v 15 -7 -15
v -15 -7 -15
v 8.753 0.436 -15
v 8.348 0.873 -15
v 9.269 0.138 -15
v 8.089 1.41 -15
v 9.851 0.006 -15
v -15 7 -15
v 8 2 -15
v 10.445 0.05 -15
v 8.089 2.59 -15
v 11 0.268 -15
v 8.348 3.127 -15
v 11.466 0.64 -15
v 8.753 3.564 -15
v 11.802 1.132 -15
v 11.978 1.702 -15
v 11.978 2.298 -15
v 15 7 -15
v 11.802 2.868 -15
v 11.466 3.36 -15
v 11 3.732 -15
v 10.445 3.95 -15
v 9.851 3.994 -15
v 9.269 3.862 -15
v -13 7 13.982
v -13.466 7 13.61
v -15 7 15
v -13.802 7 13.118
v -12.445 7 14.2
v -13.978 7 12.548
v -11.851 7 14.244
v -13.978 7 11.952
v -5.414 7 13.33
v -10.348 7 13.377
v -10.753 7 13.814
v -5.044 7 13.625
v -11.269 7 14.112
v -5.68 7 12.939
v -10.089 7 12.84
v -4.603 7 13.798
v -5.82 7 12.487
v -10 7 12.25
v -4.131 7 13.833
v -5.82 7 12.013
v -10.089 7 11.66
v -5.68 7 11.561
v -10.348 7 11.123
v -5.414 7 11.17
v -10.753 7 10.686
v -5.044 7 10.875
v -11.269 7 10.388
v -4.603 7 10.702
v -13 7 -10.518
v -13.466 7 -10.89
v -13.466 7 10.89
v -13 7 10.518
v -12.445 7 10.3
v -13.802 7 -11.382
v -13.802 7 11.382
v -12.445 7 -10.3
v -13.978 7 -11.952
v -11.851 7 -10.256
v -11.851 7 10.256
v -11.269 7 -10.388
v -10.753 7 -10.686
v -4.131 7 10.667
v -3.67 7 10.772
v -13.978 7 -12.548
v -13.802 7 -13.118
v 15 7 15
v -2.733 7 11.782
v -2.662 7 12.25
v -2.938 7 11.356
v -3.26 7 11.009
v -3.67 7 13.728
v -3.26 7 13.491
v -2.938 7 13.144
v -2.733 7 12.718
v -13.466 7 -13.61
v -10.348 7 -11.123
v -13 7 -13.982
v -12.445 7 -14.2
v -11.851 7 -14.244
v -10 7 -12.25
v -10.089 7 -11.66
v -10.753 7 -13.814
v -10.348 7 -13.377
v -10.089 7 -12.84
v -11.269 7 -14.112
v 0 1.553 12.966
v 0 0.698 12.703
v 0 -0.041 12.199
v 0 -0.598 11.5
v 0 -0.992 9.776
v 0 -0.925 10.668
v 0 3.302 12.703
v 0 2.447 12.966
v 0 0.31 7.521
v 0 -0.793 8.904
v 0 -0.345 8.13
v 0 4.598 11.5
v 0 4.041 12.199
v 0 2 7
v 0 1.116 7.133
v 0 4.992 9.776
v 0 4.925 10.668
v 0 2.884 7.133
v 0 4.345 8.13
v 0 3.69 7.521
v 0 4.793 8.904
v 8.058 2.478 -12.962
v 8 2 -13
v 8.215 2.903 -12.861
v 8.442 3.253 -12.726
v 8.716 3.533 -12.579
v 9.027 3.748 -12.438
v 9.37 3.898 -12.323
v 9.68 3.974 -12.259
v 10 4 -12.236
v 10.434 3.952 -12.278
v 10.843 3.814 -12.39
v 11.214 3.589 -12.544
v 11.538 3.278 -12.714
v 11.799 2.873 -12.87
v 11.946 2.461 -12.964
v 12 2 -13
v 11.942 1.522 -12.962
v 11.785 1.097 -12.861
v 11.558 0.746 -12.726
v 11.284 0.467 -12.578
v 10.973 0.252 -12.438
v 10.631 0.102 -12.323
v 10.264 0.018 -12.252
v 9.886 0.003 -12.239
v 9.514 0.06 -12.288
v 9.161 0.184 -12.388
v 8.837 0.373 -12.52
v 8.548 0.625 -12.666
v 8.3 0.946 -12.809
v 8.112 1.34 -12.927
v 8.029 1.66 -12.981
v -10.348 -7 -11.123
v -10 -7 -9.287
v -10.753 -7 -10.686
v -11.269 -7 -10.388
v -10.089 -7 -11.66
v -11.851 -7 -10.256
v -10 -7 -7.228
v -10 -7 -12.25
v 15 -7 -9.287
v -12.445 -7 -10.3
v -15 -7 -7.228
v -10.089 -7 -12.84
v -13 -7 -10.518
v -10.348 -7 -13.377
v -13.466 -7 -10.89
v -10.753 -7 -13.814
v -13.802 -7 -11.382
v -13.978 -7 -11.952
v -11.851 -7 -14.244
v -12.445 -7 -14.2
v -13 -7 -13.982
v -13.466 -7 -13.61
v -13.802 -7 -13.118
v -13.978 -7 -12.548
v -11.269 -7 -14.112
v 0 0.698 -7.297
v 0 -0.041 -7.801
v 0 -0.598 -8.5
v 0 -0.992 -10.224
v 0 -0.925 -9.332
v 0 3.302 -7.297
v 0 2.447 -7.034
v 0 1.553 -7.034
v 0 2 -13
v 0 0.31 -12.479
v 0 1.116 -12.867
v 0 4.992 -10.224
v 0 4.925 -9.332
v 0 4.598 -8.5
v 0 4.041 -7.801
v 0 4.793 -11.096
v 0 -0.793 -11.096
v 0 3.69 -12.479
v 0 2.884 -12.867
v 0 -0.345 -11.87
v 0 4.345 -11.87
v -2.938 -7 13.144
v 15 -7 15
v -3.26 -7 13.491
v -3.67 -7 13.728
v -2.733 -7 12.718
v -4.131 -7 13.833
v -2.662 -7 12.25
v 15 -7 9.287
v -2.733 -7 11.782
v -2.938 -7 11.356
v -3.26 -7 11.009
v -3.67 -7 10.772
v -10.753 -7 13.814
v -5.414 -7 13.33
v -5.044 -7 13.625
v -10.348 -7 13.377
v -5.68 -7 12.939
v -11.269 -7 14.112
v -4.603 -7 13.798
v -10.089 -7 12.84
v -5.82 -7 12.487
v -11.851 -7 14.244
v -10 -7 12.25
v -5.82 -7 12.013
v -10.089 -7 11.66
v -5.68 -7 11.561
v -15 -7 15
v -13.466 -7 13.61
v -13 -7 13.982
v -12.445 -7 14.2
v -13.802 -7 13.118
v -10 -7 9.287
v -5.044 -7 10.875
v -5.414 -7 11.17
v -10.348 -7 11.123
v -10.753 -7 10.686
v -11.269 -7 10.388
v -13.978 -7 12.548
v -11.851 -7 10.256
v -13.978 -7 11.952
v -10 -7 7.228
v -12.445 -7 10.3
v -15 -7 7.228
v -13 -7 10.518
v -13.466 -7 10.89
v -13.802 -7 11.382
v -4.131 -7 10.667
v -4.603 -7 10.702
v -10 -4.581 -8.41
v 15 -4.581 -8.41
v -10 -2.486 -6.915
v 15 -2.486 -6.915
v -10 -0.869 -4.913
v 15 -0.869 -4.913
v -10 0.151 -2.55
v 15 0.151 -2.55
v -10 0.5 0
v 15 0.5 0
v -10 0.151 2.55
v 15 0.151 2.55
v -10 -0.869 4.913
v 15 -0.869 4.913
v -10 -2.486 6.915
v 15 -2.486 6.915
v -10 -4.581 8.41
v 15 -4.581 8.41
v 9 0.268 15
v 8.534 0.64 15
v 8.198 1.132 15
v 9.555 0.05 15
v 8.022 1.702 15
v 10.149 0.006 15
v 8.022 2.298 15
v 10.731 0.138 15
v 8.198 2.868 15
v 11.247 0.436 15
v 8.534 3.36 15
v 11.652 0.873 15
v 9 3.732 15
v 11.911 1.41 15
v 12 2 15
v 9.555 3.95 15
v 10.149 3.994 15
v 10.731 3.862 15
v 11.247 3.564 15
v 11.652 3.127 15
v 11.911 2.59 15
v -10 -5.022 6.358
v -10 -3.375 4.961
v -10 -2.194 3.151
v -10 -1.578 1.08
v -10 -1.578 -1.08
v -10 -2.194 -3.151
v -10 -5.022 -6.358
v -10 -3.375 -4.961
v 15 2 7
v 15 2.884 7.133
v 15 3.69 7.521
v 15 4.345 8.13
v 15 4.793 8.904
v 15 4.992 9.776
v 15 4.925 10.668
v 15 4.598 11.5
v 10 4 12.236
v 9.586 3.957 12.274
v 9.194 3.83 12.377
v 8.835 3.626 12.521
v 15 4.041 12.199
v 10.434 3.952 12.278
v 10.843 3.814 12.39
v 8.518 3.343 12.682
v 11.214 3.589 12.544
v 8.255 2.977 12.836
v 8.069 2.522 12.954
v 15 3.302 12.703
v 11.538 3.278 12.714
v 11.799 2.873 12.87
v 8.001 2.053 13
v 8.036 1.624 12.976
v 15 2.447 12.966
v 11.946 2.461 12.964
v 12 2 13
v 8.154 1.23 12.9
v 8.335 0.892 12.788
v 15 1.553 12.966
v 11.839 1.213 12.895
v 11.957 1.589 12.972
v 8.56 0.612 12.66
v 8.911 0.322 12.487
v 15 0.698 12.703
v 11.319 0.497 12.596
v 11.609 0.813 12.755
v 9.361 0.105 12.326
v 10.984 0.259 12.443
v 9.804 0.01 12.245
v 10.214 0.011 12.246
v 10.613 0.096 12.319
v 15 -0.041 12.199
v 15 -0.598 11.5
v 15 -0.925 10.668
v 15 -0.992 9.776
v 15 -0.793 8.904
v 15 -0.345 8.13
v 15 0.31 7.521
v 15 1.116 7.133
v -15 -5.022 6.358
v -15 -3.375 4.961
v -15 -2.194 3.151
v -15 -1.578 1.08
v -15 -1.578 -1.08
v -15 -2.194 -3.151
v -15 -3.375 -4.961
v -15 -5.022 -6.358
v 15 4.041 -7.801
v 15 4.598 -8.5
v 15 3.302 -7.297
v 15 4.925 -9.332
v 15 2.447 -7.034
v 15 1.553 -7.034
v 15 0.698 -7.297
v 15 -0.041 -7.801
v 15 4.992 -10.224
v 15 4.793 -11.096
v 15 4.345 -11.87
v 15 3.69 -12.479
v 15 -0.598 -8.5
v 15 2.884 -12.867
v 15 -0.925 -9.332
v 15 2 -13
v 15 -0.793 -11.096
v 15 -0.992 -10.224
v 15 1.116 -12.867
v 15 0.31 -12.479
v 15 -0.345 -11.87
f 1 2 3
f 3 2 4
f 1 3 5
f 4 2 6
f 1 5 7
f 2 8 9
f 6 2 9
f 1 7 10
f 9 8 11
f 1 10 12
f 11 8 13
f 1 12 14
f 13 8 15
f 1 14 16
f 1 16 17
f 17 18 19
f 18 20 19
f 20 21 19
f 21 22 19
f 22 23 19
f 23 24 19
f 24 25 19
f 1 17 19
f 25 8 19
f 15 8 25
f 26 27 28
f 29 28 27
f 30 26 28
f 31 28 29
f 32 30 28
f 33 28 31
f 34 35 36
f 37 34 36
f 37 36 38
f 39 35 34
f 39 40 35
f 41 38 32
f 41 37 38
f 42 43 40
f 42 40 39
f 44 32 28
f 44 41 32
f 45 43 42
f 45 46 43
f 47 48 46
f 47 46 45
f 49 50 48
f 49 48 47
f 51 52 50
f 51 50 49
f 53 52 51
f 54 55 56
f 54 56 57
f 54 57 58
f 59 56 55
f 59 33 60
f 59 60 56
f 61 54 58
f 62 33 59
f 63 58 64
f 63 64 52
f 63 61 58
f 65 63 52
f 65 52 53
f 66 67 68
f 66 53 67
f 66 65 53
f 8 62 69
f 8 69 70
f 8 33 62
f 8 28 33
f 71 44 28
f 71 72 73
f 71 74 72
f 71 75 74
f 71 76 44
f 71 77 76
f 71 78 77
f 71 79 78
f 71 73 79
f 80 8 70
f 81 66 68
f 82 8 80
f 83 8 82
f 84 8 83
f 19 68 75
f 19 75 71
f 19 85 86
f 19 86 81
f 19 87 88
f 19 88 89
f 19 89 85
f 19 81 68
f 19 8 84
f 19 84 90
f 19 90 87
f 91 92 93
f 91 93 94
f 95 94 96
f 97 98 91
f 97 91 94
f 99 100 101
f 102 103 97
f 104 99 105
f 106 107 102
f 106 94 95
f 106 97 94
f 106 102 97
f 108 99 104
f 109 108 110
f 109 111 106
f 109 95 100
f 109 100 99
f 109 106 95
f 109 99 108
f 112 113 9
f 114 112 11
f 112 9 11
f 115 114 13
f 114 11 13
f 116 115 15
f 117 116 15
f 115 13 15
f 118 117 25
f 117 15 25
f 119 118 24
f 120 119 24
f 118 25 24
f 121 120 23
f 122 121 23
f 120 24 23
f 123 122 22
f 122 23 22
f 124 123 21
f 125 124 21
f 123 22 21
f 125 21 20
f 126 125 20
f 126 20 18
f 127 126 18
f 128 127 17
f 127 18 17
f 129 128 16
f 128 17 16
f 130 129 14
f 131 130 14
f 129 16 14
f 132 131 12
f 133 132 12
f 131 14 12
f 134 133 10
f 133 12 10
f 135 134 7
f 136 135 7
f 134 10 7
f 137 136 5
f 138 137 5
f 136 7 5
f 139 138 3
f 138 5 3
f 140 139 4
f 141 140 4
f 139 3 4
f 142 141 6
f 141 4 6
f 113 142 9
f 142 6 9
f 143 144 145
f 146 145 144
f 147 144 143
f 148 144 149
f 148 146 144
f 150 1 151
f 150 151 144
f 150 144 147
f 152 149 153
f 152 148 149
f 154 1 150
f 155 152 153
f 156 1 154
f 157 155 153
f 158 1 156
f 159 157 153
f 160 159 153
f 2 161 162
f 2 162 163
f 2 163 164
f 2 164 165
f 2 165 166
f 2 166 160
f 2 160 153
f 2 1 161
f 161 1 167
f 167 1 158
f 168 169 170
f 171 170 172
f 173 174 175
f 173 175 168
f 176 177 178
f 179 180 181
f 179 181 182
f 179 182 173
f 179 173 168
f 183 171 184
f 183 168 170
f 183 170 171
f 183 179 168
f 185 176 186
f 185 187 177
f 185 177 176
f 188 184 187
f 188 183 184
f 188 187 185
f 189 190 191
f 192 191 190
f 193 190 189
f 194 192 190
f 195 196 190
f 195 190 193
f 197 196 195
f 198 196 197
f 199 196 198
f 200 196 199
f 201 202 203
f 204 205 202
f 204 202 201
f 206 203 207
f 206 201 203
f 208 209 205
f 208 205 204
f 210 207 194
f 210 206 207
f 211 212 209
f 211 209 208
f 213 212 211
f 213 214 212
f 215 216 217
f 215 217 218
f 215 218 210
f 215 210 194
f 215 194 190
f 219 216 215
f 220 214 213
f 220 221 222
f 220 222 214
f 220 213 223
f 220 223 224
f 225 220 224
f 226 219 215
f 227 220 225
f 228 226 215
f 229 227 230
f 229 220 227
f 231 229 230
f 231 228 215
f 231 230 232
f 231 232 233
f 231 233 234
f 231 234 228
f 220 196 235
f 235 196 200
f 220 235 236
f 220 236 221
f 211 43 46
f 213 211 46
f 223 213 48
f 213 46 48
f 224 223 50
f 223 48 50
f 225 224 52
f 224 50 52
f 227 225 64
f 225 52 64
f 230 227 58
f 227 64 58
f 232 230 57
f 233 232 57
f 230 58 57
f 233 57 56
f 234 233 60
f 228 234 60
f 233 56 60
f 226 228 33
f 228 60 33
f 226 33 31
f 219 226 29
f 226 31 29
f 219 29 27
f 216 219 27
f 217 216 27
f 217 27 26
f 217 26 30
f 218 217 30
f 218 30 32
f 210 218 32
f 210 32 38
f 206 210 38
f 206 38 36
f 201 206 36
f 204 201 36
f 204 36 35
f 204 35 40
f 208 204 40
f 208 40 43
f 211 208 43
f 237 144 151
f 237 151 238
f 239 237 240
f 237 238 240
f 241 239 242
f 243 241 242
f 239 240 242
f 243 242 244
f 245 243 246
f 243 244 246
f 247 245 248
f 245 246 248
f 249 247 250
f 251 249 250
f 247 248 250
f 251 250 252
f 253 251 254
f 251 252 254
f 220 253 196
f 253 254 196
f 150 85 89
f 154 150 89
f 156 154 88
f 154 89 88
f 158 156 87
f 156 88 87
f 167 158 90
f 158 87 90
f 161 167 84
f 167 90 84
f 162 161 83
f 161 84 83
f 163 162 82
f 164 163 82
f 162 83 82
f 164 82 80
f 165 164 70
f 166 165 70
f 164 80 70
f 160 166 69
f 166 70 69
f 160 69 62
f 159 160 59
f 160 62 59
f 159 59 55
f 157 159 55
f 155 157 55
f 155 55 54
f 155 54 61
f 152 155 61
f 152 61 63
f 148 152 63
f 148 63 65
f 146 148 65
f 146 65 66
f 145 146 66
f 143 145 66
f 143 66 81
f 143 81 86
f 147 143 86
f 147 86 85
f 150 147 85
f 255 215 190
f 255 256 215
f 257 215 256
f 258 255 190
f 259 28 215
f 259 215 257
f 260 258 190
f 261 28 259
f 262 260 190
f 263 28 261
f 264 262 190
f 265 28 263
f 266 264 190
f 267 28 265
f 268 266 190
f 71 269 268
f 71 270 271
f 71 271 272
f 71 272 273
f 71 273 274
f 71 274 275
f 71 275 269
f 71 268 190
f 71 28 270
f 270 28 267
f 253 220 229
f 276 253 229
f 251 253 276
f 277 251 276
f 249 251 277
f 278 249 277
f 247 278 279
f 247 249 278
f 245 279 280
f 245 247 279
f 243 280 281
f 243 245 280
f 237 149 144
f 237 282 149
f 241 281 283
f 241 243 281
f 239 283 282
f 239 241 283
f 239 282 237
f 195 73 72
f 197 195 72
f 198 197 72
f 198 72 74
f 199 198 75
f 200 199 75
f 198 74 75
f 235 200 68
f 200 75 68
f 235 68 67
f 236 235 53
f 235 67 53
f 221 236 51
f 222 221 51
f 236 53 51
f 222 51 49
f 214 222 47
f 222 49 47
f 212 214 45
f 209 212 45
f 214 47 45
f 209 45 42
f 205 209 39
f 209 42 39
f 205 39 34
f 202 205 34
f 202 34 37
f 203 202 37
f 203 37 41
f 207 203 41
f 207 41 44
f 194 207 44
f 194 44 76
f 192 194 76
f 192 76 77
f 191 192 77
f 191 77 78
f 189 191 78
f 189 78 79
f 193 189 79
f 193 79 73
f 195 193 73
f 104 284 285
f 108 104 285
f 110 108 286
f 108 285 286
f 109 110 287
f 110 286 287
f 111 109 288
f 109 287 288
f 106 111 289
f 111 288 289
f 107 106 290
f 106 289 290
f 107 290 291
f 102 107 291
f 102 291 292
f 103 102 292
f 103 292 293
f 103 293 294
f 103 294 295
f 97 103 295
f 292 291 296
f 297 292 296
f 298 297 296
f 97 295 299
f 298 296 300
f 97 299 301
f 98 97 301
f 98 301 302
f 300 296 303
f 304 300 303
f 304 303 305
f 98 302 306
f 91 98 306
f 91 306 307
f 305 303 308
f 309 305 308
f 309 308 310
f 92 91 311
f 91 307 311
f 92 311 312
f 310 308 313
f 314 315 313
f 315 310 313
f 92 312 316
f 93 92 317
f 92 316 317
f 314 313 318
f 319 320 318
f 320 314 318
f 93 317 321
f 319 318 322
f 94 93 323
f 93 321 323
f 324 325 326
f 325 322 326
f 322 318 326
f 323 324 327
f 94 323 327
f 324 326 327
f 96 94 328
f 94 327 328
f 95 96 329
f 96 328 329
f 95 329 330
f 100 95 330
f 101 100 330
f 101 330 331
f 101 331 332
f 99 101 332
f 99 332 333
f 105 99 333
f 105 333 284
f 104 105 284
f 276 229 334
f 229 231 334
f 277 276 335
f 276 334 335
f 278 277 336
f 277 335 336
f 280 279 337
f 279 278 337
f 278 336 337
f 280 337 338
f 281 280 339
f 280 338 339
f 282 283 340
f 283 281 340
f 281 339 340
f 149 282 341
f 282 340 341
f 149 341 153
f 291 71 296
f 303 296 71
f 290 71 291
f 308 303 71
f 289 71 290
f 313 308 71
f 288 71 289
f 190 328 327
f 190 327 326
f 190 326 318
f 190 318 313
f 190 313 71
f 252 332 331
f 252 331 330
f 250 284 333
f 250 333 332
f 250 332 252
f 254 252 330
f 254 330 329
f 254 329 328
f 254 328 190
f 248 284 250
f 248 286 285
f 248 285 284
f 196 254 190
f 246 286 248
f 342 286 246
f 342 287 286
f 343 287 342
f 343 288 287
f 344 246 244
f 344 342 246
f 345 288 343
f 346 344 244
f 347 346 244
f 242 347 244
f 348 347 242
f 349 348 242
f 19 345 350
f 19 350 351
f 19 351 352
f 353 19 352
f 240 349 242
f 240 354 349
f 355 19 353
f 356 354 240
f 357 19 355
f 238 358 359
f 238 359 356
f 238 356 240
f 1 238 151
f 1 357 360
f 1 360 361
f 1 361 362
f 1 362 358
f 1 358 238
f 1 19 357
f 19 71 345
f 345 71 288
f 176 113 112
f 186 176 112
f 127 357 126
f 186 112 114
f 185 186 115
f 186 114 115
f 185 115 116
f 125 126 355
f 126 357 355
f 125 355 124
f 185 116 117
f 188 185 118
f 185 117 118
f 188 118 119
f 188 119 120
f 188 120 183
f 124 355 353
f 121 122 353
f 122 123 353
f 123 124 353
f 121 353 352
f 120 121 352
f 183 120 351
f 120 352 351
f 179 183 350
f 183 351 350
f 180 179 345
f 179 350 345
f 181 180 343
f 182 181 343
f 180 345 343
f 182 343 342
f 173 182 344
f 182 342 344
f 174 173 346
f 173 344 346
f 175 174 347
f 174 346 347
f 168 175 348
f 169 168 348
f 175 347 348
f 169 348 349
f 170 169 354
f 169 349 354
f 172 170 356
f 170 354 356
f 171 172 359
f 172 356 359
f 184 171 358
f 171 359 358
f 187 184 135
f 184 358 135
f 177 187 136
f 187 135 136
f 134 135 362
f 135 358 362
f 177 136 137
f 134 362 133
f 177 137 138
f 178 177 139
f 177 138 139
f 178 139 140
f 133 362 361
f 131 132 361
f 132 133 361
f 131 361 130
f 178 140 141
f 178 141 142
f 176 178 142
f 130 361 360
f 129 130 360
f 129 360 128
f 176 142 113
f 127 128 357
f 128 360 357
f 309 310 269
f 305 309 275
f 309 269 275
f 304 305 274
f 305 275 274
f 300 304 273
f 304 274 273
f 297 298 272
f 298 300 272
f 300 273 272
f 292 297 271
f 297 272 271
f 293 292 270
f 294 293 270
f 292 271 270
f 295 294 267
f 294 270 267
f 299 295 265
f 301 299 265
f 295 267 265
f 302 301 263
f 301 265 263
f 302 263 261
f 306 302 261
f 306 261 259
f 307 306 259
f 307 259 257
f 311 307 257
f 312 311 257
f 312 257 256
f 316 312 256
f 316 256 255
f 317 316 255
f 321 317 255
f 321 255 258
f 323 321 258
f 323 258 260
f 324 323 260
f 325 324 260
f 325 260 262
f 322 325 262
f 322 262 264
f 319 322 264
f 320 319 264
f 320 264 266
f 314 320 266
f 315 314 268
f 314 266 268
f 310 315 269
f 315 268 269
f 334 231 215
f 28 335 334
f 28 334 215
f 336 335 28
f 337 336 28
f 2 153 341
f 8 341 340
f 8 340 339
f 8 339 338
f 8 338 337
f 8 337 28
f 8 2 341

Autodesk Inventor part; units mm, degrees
ref_plane "YZ Plane" through (0, 0, 0) normal (1, 0, 0) x (0, 1, 0)
ref_plane "XZ Plane" through (0, 0, 0) normal (0, 1, 0) x (-1, 0, 0)
ref_plane "XY Plane" through (0, 0, 0) normal (0, 0, 1) x (1, 0, 0)
sketch "Sketch1" plane through (0, 0, 0) normal (0, 0, 1) x (1, 0, 0)
  line L0 (15, -7) -> (-15, -7)
  line L1 (-15, -7) -> (-15, 7)
  line L2 (-15, 7) -> (15, 7)
  line L3 (15, 7) -> (15, -7)
  line L4 (15, -7) -> (-15, 7) construction
  line L5 (-15, -7) -> (15, 7) construction
  point P0 (0, 0)
  dimension "d0" = 30
  dimension "d1" = 14
extrude "Extrusion1" add sketch "Sketch1" along normal blind 30
sketch "Sketch3" plane through (15, -7, 0) normal (1, 0, 0) x (0, 0, -1)
  line L0 (0, 0) -> (-30, 0) projected
  line L1 (-15, 0) -> (-15, -2)
  arc A0 (-5.7129, 0) -> (-24.2871, 0) centre (-15, -2) ccw
  point P0 (0, 7)
  dimension "d4" = 2
  dimension "d5" = 19
extrude "Extrusion2" cut sketch "Sketch3" against normal blind 25
sketch "Sketch5" plane through (-15, 7, 0) normal (0, 1, 0) x (1, 0, 0)
  line L0 (30, 0) -> (0, 0) projected
  line L1 (30, -30) -> (0, -30) projected
  line L2 (0, -30) -> (0, -27.25)
  line L3 (0, 0) -> (0, -30) projected
  line L4 (0, -27.25) -> (2.75, -27.25)
  circle A0 centre (2.75, -27.25) radius 2
  line L5 (0, 0) -> (0, -2.75)
  line L6 (0, -2.75) -> (2.75, -2.75)
  circle A1 centre (2.75, -2.75) radius 2
  line L7 (2.75, -27.25) -> (10.75, -27.25)
  circle A2 centre (10.75, -27.25) radius 1.5875
  point P0 (15, 0)
  dimension "d11" = 2.75
  dimension "d12" = 2.75
  dimension "d13" = 4
  dimension "d14" = 2.75
  dimension "d15" = 2.75
  dimension "d16" = 4
  dimension "d17" = 8
  dimension "d18" = 3.175
extrude "Extrusion3" cut sketch "Sketch5" against normal blind 100 contours A2
sketch "Sketch6" plane through (-15, 7, 0) normal (0, 1, 0) x (1, 0, 0)
  point P0 (15, 0)
sketch "Sketch7" plane through (15, -7, 0) normal (1, 0, 0) x (0, 0, -1)
  line L0 (0, 14) -> (-30, 14) projected
  line L1 (-30, 14) -> (-25, 14)
  line L2 (-25, 14) -> (-25, 9)
  line L3 (0, 14) -> (0, 0) projected
  line L4 (0, 14) -> (-5, 14)
  line L5 (-5, 14) -> (-5, 9)
  circle A0 centre (-25, 9) radius 3
  circle A1 centre (-5, 9) radius 3
  point P0 (0, 7)
  dimension "d21" = 5
  dimension "d22" = 5
  dimension "d23" = 5
  dimension "d24" = 5
  dimension "d25" = 6
  dimension "d26" = 6
extrude "Extrusion4" cut sketch "Sketch7" against normal blind 15
move or copy body "Move Body1" bodies to move or copy 1 copy no translate (-20, 0, 0)
move or copy body "Move Body2" bodies to move or copy 1 copy no translate (-5, 0, 0)
sketch "Sketch8" plane through (0, 0, 0) normal (1, 0, 0) x (0, 1, 0)
  point P0 (0, 0)
sketch "Sketch9" plane through (-40, 7, 0) normal (0, 1, 0) x (1, 0, 0)
  line L0 (30, -30) -> (0, -30) projected
  line L1 (0, -30) -> (0, -27.25)
  line L2 (0, 0) -> (0, -30) projected
  line L3 (0, -27.25) -> (3, -27.25)
  circle A0 centre (3, -27.25) radius 2
  line L4 (0, 0) -> (0, -2.75)
  line L5 (0, -2.75) -> (3, -2.75)
  circle A1 centre (3, -2.75) radius 2
  point P0 (40, 0)
  dimension "d35" = 2.75
  dimension "d36" = 3
  dimension "d37" = 4
  dimension "d38" = 2.75
  dimension "d39" = 4
  dimension "d40" = 3
extrude "Extrusion5" cut sketch "Sketch9" against normal blind 14
sketch "Sketch14" plane through (-40, 7, 30) normal (0, 0, 1) x (1, 0, 0)
  line L0 (30, 0) -> (0, 0) projected
  line L1 (30, 0) -> (25, 0)
  line L2 (25, 0) -> (25, -5)
  circle A0 centre (25, -5) radius 2
  point P0 (40, -7)
  dimension "d47" = 5
  dimension "d48" = 5
  dimension "d49" = 4
extrude "Extrusion6" cut sketch "Sketch14" against normal blind 3
sketch "Sketch15" plane through (-10, 7, 0) normal (0, 0, -1) x (-1, 0, 0)
  line L0 (0, -14) -> (0, 0) projected
  line L1 (0, 0) -> (5, 0)
  line L2 (0, 0) -> (30, 0) projected
  line L3 (5, 0) -> (5, -5)
  circle A0 centre (5, -5) radius 2
  point P0 (-10, -7)
  dimension "d52" = 5
  dimension "d53" = 5
  dimension "d54" = 4
extrude "Extrusion7" cut sketch "Sketch15" against normal blind 4
thread "Thread3" size "M4x0.7" class "6H" standard "ANSI Metric M Profile" full length
thread "Thread4" size "M4x0.7" class "6H" standard "ANSI Metric M Profile" full length
sketch "Sketch16" plane through (-40, -7, 0) normal (-1, 0, 0) x (0, 0, 1)
  line L0 (0, 14) -> (30, 14) projected
  line L1 (0, 14) -> (15, 14)
  line L2 (15, 14) -> (15, -2)
  circle A0 centre (15, -2) radius 7.5
  point P0 (0, 7)
  dimension "d61" = 16
  dimension "d62" = 15
extrude "Extrusion8" cut sketch "Sketch16" against normal blind 15
move or copy body "Move Body3" bodies to move or copy 1 copy no translate (25, 0, 0)
move or copy body "Move Body4" bodies to move or copy 1 copy no translate (10, 0, -15)
move or copy body "Move Body5" bodies to move or copy 1 copy no translate (-10, 0, 0)
equation "\"d55\" = d54"
properties part number "Rb oven housing top-back" material "Copper"
